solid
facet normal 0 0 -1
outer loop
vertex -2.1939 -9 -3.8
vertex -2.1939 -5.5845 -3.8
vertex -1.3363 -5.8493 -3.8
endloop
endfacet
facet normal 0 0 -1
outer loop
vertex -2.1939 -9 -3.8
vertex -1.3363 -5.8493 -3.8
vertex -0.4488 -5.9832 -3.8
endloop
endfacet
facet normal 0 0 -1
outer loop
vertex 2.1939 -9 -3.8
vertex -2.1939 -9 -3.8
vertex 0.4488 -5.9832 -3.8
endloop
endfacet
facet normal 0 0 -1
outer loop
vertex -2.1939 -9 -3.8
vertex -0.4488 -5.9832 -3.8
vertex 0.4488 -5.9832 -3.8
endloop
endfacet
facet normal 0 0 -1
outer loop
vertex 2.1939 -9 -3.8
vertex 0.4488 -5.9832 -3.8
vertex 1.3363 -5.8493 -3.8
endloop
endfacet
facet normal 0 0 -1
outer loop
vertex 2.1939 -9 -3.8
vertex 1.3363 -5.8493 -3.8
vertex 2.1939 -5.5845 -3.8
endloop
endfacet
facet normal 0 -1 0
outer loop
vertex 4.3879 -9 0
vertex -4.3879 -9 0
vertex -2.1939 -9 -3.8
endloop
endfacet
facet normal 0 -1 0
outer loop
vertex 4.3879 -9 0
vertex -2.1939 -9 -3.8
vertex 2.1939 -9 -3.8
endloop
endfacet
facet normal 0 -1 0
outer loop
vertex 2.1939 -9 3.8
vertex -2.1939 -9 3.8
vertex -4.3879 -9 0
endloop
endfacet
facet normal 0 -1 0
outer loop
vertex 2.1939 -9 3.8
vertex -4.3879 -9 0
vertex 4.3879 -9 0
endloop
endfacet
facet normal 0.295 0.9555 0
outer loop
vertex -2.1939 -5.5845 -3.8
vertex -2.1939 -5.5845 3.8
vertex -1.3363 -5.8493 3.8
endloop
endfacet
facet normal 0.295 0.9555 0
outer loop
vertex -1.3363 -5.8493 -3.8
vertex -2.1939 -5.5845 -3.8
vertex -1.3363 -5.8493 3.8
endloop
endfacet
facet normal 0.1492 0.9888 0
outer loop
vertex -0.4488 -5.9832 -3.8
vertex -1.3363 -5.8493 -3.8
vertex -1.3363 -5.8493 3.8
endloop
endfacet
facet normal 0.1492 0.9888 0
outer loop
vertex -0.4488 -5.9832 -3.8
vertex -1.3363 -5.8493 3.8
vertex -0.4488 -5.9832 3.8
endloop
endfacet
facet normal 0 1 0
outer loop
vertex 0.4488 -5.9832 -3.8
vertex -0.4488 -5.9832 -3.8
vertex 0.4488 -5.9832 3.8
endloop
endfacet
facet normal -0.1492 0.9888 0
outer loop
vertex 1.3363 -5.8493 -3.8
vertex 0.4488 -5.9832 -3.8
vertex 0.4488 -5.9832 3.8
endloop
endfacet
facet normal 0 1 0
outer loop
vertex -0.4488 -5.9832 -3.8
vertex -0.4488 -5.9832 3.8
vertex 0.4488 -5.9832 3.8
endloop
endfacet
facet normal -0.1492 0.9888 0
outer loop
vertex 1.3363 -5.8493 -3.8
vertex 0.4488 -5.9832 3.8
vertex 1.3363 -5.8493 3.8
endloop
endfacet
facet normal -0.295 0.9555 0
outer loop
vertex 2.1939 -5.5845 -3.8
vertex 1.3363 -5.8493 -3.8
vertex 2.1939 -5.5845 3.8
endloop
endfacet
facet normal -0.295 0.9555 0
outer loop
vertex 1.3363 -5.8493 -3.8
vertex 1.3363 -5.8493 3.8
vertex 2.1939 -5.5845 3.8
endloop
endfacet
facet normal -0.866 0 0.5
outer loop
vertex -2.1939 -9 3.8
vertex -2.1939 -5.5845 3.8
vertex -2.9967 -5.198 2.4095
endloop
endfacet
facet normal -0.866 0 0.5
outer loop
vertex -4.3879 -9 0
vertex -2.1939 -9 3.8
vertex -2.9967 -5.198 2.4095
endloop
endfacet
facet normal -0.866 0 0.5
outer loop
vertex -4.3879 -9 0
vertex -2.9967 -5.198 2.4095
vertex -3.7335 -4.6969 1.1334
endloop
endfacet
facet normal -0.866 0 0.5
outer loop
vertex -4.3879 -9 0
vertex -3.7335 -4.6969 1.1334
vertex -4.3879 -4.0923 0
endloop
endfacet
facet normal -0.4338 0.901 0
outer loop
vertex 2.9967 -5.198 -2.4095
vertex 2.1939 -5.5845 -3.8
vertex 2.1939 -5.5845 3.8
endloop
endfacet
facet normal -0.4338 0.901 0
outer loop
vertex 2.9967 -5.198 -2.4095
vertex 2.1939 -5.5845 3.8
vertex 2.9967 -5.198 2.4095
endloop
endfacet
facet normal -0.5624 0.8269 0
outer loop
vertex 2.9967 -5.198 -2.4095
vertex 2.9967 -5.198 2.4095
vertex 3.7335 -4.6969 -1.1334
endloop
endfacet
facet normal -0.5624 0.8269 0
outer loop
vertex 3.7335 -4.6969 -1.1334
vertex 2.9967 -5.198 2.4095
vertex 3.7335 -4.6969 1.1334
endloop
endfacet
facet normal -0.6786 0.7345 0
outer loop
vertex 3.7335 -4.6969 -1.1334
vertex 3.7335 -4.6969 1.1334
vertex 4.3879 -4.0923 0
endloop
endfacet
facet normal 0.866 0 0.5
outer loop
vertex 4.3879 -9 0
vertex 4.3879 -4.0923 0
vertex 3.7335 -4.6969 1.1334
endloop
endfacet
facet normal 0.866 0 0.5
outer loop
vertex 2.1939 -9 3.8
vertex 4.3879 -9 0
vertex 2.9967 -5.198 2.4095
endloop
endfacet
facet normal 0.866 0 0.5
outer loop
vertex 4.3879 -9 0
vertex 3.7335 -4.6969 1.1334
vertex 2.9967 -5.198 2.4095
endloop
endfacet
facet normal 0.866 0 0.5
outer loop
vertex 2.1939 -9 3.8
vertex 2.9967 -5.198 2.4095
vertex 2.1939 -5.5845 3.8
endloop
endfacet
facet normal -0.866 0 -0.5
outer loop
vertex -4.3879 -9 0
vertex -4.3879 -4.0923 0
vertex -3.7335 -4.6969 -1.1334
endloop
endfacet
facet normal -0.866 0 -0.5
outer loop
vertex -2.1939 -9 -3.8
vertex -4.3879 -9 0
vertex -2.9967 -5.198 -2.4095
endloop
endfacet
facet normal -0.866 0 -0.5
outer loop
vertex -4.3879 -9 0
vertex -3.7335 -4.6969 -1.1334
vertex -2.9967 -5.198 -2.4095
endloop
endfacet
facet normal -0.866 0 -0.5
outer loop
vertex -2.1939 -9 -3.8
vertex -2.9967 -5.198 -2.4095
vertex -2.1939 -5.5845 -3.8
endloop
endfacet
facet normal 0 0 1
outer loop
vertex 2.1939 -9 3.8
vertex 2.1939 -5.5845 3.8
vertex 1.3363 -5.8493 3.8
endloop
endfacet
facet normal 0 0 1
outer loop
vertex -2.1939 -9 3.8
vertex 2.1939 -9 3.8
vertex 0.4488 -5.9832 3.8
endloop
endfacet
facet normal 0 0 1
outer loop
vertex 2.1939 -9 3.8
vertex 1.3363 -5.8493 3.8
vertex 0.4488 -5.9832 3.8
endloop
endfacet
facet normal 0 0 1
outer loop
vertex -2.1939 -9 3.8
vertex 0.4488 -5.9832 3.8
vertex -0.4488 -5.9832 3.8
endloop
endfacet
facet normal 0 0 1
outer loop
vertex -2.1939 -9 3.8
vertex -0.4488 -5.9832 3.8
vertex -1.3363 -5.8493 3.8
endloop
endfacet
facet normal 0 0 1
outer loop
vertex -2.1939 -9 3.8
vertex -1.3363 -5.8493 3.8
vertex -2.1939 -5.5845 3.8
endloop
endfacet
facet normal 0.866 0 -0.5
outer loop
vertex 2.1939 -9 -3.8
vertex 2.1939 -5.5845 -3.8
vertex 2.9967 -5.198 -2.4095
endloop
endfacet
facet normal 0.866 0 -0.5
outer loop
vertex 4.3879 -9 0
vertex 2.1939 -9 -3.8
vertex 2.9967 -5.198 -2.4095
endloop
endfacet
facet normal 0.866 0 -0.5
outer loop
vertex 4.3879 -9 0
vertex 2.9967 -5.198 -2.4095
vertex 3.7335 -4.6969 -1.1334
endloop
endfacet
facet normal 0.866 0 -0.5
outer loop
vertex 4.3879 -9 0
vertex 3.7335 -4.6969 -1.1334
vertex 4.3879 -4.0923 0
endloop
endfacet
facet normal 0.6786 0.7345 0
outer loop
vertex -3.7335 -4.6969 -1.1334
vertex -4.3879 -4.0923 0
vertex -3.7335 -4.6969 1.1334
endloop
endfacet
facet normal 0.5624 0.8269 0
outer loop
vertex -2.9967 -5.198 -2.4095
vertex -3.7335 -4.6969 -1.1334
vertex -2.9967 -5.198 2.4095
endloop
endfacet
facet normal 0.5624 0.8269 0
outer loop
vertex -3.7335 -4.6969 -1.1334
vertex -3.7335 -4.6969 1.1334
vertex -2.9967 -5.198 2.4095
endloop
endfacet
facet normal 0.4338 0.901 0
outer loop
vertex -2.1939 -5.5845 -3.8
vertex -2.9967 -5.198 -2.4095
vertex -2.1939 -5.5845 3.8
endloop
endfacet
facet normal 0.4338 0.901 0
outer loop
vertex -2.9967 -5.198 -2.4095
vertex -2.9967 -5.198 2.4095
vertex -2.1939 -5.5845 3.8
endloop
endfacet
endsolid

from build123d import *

# Parameters (mm, degrees)
F1_DEPTH = 9
F3_DEPTH = 25


with BuildPart() as f1:
    # F0 (on Front) → F1 (new body)
    with BuildSketch(Plane.XZ):
        Polygon((2.193931, 3.8), (-2.193931, 3.8), (-4.387862, 0), (-2.193931, -3.8), (2.193931, -3.8), (4.387862, 0), align=None)
    extrude(amount=F1_DEPTH)

    # F2 (on face) → F3 (cut)
    with BuildSketch(Plane.XY.offset(3.8)):
        with BuildLine():
            Line((-2.193931, 0), (-2.193931, -5.584502))
            ThreePointArc((-2.193931, -5.584502), (0, -6), (2.193931, -5.584502))
            Line((2.193931, -5.584502), (2.193931, 0))
            Line((2.193931, 0), (-2.193931, 0))
        make_face()
        with BuildLine():
            ThreePointArc((2.193931, -5.584502), (4.958003, -3.379084), (6, 0))
            ThreePointArc((6, 0), (-3.379084, 4.958003), (-2.193931, -5.584502))
            Line((-2.193931, -5.584502), (-2.193931, 0))
            Line((-2.193931, 0), (2.193931, 0))
            Line((2.193931, 0), (2.193931, -5.584502))
        make_face()
    extrude(amount=-F3_DEPTH, mode=Mode.SUBTRACT)


solid = f1.part
